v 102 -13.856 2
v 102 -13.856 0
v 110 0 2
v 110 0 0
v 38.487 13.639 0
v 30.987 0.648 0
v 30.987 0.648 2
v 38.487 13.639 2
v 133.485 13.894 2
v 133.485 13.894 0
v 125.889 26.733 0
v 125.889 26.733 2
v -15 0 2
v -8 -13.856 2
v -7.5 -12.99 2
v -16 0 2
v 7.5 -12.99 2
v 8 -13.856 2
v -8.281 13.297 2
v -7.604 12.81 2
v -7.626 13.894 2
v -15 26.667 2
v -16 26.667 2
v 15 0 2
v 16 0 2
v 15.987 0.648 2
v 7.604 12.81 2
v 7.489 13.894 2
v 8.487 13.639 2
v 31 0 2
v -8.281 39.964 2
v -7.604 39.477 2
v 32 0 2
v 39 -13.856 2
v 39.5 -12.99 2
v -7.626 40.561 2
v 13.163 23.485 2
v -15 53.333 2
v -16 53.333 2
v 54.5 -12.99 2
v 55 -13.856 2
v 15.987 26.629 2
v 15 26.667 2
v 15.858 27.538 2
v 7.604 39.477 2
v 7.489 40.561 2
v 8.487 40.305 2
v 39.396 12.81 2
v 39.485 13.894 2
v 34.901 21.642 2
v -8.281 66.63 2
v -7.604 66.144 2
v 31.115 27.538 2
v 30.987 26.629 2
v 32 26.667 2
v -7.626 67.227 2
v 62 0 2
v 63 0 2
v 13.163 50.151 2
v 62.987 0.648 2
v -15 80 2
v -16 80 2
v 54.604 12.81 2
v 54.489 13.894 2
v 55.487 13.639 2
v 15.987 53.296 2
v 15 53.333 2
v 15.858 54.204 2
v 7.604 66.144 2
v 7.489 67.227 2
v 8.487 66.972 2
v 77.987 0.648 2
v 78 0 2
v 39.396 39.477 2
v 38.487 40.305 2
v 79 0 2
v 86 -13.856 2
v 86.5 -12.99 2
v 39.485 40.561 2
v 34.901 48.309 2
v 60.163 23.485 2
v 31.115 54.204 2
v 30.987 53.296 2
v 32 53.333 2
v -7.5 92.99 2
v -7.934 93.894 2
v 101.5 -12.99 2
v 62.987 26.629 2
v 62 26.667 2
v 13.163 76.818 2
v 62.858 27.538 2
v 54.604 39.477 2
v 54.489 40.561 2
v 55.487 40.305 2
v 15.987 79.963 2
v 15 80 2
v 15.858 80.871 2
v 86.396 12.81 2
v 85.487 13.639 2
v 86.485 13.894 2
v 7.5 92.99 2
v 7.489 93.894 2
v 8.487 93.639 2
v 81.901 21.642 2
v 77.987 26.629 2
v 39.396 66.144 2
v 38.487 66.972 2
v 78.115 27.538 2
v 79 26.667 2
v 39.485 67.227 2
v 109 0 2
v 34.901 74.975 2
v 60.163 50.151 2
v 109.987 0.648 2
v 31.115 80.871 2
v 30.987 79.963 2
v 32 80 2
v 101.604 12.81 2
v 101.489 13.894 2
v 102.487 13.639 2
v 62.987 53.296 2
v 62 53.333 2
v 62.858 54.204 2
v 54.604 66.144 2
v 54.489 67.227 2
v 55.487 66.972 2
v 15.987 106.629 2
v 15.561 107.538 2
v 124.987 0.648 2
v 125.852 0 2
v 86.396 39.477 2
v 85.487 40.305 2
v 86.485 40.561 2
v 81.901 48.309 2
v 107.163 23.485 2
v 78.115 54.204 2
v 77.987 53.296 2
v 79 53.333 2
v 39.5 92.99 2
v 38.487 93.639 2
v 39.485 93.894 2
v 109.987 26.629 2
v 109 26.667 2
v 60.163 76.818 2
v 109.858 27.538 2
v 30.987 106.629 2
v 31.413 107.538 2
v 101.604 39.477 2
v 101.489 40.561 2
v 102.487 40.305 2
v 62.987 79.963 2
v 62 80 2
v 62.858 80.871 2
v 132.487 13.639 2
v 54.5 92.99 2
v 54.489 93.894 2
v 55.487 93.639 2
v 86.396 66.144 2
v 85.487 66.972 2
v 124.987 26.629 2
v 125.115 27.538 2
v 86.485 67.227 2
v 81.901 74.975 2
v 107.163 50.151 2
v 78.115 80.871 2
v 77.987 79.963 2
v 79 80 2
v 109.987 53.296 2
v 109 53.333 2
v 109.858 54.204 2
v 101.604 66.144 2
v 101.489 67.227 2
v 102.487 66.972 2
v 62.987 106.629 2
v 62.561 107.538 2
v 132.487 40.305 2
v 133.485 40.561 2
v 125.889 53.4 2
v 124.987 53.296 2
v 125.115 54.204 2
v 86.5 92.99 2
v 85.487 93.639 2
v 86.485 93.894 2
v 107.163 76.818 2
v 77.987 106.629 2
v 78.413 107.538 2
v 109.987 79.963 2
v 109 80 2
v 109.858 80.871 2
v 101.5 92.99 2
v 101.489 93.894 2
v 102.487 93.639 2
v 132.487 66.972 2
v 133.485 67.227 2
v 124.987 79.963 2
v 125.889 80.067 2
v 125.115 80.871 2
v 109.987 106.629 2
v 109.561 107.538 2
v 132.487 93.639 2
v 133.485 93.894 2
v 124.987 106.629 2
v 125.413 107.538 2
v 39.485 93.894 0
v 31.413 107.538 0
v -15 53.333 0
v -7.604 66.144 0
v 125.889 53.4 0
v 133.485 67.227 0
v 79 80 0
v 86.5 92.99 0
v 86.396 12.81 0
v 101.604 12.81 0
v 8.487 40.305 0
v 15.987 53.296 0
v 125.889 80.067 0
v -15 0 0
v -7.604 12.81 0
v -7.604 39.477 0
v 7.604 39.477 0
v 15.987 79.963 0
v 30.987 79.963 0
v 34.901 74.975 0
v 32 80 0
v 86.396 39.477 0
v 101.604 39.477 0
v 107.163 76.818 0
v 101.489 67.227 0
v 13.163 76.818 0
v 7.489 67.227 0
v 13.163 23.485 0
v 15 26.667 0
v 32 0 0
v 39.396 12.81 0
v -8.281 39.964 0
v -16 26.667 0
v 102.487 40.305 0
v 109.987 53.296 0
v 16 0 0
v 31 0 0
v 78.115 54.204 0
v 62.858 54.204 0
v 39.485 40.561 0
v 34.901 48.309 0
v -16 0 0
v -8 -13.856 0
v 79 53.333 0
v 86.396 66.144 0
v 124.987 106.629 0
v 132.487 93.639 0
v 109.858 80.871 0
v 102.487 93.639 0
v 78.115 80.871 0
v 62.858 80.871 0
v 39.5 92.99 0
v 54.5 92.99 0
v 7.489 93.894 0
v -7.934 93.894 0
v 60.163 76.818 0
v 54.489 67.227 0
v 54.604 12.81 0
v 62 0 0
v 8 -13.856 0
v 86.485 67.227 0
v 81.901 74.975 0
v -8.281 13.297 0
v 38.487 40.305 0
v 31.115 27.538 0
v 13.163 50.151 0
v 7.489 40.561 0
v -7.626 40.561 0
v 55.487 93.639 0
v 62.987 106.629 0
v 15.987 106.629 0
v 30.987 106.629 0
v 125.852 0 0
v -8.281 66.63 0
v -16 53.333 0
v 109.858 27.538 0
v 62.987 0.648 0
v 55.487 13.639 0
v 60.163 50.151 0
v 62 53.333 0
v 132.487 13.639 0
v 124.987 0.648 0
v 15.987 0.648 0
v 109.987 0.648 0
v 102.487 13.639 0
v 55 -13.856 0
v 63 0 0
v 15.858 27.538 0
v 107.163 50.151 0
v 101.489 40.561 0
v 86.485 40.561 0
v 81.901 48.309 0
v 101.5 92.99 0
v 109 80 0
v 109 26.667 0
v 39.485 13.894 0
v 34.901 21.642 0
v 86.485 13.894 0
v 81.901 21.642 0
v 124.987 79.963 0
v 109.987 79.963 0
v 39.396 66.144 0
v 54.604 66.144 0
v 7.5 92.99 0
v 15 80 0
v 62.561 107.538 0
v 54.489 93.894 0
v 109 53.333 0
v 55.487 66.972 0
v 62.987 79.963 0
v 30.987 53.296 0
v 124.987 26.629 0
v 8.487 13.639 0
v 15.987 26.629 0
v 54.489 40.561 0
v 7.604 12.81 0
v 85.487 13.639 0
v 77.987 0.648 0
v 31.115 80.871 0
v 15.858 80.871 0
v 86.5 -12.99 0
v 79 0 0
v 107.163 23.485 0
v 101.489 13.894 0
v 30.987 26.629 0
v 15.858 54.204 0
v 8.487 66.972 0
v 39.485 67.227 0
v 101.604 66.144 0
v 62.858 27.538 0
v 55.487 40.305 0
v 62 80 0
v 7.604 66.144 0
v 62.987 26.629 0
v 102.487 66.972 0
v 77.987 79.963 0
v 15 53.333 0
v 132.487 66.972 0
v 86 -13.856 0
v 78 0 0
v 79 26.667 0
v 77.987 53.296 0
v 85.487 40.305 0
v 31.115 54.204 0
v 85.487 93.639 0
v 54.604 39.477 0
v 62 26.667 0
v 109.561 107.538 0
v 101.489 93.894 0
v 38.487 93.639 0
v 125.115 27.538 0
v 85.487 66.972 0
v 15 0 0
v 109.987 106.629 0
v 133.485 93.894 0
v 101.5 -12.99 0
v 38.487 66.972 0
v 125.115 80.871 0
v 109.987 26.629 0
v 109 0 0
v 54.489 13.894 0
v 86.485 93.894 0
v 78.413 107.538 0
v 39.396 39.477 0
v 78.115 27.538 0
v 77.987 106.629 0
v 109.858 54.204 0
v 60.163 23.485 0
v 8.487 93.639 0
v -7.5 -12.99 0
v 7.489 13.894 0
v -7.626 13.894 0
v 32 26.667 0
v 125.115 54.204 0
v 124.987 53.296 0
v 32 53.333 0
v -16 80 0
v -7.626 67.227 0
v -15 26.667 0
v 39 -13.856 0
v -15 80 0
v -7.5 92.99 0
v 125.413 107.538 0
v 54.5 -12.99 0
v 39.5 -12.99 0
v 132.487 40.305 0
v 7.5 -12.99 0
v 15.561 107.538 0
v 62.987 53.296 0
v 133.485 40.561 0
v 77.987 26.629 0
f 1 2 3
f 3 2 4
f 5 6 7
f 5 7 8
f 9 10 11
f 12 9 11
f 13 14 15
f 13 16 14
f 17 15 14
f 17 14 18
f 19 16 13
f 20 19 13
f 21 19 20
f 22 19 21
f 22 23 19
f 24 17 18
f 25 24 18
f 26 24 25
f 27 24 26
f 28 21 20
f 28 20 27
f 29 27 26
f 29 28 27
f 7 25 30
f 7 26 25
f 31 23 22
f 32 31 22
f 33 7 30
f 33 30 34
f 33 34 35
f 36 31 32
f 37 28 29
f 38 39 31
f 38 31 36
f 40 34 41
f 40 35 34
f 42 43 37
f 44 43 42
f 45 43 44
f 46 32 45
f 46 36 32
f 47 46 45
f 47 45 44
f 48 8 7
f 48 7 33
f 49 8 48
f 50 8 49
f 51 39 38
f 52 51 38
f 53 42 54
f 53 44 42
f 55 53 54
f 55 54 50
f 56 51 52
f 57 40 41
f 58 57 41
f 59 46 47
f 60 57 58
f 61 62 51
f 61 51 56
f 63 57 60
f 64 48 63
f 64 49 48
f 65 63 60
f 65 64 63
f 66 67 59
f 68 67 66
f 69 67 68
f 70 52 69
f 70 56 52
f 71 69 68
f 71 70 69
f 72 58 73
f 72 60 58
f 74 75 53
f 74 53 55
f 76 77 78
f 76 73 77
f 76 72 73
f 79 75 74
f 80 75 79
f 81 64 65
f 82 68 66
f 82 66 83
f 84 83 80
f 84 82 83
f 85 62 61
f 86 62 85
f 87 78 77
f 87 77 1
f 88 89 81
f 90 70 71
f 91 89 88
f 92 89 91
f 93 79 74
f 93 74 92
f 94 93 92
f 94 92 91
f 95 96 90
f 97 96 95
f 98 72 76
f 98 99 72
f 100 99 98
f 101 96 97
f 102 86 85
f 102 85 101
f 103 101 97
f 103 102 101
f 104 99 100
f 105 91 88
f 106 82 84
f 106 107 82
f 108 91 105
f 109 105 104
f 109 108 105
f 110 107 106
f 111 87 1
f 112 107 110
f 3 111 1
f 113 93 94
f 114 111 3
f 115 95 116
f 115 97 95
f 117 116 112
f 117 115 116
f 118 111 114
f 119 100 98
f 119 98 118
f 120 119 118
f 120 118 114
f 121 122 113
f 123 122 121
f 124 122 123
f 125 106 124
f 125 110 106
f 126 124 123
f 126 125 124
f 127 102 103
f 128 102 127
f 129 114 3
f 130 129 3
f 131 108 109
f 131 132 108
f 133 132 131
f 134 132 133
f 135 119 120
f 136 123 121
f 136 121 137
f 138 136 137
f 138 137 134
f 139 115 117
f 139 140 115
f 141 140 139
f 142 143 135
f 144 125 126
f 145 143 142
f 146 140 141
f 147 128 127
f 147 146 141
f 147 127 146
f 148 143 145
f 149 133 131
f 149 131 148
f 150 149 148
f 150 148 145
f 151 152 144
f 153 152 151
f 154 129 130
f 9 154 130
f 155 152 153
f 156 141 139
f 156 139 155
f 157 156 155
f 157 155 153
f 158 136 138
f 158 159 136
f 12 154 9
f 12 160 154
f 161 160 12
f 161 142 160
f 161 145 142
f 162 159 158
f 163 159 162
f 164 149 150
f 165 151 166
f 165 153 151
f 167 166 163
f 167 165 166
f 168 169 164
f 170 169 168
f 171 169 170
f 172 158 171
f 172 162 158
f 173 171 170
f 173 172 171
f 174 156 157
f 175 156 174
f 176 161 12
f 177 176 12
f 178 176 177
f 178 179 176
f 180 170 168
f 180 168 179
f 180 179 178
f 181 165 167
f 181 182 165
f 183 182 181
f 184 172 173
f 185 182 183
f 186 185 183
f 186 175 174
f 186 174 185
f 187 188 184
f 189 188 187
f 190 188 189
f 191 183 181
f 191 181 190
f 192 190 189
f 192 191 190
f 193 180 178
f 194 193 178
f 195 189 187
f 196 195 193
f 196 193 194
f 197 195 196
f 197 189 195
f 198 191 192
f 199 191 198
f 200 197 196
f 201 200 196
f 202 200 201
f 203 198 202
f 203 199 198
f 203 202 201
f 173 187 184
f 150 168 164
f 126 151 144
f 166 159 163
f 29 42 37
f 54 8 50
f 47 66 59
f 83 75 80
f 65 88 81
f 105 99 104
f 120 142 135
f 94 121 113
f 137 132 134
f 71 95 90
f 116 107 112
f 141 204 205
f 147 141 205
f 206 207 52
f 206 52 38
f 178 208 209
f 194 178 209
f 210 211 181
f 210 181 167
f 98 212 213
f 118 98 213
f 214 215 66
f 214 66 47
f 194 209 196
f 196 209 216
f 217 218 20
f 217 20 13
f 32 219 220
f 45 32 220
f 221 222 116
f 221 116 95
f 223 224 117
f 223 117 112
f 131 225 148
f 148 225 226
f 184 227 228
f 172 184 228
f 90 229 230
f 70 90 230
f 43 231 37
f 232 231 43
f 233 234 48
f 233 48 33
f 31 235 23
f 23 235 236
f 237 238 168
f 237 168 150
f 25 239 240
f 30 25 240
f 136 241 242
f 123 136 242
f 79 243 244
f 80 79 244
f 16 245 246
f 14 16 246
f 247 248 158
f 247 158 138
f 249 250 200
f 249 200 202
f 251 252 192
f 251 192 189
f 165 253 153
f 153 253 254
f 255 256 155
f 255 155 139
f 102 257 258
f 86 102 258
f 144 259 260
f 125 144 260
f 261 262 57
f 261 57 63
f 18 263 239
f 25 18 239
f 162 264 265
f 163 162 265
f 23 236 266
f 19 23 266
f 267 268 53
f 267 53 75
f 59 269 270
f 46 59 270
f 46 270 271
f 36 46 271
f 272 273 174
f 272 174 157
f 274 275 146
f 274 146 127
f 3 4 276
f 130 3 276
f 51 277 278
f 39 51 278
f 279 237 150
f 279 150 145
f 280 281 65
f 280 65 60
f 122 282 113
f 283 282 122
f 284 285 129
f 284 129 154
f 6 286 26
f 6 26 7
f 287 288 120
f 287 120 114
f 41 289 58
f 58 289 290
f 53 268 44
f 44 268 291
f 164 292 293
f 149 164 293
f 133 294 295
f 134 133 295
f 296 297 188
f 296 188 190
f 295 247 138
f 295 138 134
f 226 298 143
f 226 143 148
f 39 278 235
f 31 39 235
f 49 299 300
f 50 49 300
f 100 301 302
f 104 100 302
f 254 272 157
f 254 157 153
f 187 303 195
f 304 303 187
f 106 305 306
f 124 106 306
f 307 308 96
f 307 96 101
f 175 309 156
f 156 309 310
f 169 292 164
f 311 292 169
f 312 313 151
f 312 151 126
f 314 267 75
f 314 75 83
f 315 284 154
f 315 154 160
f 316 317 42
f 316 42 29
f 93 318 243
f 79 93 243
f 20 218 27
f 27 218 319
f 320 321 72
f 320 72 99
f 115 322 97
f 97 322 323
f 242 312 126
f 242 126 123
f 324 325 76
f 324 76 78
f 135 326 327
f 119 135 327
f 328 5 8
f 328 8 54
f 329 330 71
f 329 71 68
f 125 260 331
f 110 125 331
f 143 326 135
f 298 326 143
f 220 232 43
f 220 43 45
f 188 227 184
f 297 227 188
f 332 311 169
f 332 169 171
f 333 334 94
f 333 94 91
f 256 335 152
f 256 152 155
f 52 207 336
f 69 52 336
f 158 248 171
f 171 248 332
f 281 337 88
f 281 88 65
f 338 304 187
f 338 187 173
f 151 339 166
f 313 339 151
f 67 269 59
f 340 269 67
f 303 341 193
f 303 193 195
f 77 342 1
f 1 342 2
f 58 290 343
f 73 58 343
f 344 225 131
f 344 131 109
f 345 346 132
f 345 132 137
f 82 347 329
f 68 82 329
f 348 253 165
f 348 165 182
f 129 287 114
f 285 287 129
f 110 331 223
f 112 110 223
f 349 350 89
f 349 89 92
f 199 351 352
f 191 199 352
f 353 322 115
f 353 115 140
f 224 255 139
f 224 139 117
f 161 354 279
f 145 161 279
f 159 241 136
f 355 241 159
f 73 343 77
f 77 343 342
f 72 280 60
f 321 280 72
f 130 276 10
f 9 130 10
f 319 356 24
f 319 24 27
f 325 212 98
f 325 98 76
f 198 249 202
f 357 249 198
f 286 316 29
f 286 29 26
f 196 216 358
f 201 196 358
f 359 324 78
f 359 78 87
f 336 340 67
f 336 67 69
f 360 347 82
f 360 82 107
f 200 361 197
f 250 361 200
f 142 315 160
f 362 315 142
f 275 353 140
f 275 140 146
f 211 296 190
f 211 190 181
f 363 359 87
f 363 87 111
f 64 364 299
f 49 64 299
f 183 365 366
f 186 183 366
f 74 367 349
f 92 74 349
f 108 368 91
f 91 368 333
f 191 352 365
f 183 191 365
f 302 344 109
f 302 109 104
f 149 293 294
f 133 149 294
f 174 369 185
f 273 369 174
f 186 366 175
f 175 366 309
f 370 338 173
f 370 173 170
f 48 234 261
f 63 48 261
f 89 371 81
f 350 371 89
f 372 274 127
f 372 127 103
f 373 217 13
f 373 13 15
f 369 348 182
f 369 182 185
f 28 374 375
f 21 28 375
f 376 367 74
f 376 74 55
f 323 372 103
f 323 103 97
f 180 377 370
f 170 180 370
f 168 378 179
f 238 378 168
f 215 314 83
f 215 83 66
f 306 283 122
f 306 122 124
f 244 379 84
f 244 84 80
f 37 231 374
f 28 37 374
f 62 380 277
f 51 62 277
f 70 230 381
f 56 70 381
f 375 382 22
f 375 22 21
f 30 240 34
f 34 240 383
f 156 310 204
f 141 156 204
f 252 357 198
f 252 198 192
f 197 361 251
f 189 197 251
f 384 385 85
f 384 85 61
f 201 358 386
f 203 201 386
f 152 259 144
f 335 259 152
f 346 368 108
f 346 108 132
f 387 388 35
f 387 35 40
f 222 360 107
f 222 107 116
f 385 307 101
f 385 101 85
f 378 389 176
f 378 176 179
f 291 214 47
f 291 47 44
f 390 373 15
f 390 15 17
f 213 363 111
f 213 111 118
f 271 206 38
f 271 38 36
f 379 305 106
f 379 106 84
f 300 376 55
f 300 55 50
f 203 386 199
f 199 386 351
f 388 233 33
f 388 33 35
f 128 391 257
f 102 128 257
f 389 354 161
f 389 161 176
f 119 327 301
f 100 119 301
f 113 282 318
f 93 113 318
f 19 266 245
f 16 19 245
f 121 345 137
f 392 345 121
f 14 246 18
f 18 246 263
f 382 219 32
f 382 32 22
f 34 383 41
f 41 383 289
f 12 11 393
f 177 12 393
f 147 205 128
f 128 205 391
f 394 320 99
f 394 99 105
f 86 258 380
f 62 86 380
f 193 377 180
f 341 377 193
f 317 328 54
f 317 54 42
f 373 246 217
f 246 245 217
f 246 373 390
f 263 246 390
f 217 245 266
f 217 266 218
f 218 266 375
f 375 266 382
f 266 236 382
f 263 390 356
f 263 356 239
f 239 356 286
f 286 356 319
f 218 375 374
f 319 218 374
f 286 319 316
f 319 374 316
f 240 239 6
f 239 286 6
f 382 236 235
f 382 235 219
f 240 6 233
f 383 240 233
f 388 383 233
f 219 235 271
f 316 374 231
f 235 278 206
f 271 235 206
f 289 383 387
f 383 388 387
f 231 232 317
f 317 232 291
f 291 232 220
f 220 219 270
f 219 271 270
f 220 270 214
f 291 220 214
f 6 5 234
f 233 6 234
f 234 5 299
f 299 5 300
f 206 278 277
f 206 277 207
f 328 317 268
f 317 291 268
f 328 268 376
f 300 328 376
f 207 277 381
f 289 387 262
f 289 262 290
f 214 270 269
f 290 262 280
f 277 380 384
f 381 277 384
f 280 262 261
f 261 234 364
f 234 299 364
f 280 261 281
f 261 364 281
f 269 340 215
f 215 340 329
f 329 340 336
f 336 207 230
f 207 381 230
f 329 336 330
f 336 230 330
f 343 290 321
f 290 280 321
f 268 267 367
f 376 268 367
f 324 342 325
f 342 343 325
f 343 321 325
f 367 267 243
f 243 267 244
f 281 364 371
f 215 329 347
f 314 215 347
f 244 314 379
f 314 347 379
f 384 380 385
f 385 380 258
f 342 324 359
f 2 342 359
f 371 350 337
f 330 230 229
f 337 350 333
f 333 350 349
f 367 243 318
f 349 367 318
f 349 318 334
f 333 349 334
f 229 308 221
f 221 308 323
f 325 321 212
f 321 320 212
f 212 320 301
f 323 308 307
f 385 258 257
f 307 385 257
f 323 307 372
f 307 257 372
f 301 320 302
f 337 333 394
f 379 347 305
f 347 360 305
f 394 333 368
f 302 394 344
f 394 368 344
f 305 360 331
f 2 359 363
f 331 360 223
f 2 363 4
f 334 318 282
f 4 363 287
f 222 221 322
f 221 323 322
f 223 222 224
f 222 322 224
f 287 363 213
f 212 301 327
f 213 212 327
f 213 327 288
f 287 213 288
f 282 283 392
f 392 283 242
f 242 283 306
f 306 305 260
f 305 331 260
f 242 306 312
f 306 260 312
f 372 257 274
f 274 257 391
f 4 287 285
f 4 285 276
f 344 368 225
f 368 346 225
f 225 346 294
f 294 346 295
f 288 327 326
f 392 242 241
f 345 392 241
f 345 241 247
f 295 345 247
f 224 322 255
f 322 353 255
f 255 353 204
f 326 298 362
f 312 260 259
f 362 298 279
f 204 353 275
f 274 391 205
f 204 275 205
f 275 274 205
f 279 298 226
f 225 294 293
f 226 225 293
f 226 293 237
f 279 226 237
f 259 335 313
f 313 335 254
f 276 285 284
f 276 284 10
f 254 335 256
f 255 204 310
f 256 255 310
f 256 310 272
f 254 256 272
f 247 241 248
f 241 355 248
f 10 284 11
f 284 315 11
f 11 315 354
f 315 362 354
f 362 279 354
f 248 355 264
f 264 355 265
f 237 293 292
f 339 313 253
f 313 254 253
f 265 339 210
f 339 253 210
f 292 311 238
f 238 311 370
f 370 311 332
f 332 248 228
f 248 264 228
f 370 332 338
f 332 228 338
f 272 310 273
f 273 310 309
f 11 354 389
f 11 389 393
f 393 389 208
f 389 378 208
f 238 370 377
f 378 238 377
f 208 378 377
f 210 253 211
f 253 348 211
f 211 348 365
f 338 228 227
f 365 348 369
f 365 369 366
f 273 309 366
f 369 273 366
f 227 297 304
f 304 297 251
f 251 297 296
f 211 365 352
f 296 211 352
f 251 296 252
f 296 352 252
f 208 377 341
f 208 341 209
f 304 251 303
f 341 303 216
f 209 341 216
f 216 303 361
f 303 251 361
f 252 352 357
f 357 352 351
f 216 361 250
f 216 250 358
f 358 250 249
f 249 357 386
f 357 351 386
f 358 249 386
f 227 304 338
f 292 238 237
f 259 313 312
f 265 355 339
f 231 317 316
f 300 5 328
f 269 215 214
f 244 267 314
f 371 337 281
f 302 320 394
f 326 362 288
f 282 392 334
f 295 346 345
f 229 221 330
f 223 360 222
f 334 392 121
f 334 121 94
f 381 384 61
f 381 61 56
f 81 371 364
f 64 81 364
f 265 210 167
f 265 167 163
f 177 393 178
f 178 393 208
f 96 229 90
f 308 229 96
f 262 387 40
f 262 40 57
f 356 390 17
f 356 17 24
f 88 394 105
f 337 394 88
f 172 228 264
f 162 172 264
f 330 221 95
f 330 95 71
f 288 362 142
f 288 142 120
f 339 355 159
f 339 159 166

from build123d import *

# Parameters (mm, degrees)
PAD_DEPTH                 = 2
PAD_LINEARPATTERN_2_DEPTH = 2
PAD_LINEARPATTERN_3_DEPTH = 2
LINEARPATTERN001_COUNT    = 4
LINEARPATTERN001_PITCH    = 26.666667


with BuildPart() as part:
    # Sketch → Pad (new body)
    with BuildSketch(Plane.XY):
        Polygon((7.488891, 13.894065), (-7.934416, 13.894065), (-16, 0), (-8, -13.856406), (8, -13.856406), (16, 0), (31.852406, 0), (39.484819, 13.894065), (31.413057, 27.537577), (15.560652, 27.537577), align=None)
        Polygon((-15, 0), (-7.5, -12.990381), (7.5, -12.990381), (15, 0), (7.5, 12.990381), (-7.5, 12.990381), align=None, mode=Mode.SUBTRACT)
        Polygon((8.486855, 13.638825), (15.986855, 0.648444), (30.986855, 0.648444), (38.486855, 13.638825), (30.986855, 26.629206), (15.986855, 26.629206), align=None, mode=Mode.SUBTRACT)
    pad = extrude(amount=PAD_DEPTH)

    # Sketch LinearPattern 2 → Pad LinearPattern 2 (add)
    with BuildSketch(Plane(origin=(47, 0, 0), x_dir=(1, 0, 0), z_dir=(0, 0, 1))):
        Polygon((7.488891, 13.894065), (-7.934416, 13.894065), (-16, 0), (-8, -13.856406), (8, -13.856406), (16, 0), (31.852406, 0), (39.484819, 13.894065), (31.413057, 27.537577), (15.560652, 27.537577), align=None)
        Polygon((-15, 0), (-7.5, -12.990381), (7.5, -12.990381), (15, 0), (7.5, 12.990381), (-7.5, 12.990381), align=None, mode=Mode.SUBTRACT)
        Polygon((8.486855, 13.638825), (15.986855, 0.648444), (30.986855, 0.648444), (38.486855, 13.638825), (30.986855, 26.629206), (15.986855, 26.629206), align=None, mode=Mode.SUBTRACT)
    pad_linearpattern_2 = extrude(amount=PAD_LINEARPATTERN_2_DEPTH)

    # Sketch LinearPattern 3 → Pad LinearPattern 3 (add)
    with BuildSketch(Plane(origin=(94, 0, 0), x_dir=(1, 0, 0), z_dir=(0, 0, 1))):
        Polygon((7.488891, 13.894065), (-7.934416, 13.894065), (-16, 0), (-8, -13.856406), (8, -13.856406), (16, 0), (31.852406, 0), (39.484819, 13.894065), (31.413057, 27.537577), (15.560652, 27.537577), align=None)
        Polygon((-15, 0), (-7.5, -12.990381), (7.5, -12.990381), (15, 0), (7.5, 12.990381), (-7.5, 12.990381), align=None, mode=Mode.SUBTRACT)
        Polygon((8.486855, 13.638825), (15.986855, 0.648444), (30.986855, 0.648444), (38.486855, 13.638825), (30.986855, 26.629206), (15.986855, 26.629206), align=None, mode=Mode.SUBTRACT)
    pad_linearpattern_3 = extrude(amount=PAD_LINEARPATTERN_3_DEPTH)

    # LinearPattern001: Pad, Pad LinearPattern 2, Pad LinearPattern 3 ×4
    with Locations(*[(0, i * LINEARPATTERN001_PITCH, 0) for i in range(1, LINEARPATTERN001_COUNT)]):
        add(pad)
        add(pad_linearpattern_2)
        add(pad_linearpattern_3)


solid = part.part
